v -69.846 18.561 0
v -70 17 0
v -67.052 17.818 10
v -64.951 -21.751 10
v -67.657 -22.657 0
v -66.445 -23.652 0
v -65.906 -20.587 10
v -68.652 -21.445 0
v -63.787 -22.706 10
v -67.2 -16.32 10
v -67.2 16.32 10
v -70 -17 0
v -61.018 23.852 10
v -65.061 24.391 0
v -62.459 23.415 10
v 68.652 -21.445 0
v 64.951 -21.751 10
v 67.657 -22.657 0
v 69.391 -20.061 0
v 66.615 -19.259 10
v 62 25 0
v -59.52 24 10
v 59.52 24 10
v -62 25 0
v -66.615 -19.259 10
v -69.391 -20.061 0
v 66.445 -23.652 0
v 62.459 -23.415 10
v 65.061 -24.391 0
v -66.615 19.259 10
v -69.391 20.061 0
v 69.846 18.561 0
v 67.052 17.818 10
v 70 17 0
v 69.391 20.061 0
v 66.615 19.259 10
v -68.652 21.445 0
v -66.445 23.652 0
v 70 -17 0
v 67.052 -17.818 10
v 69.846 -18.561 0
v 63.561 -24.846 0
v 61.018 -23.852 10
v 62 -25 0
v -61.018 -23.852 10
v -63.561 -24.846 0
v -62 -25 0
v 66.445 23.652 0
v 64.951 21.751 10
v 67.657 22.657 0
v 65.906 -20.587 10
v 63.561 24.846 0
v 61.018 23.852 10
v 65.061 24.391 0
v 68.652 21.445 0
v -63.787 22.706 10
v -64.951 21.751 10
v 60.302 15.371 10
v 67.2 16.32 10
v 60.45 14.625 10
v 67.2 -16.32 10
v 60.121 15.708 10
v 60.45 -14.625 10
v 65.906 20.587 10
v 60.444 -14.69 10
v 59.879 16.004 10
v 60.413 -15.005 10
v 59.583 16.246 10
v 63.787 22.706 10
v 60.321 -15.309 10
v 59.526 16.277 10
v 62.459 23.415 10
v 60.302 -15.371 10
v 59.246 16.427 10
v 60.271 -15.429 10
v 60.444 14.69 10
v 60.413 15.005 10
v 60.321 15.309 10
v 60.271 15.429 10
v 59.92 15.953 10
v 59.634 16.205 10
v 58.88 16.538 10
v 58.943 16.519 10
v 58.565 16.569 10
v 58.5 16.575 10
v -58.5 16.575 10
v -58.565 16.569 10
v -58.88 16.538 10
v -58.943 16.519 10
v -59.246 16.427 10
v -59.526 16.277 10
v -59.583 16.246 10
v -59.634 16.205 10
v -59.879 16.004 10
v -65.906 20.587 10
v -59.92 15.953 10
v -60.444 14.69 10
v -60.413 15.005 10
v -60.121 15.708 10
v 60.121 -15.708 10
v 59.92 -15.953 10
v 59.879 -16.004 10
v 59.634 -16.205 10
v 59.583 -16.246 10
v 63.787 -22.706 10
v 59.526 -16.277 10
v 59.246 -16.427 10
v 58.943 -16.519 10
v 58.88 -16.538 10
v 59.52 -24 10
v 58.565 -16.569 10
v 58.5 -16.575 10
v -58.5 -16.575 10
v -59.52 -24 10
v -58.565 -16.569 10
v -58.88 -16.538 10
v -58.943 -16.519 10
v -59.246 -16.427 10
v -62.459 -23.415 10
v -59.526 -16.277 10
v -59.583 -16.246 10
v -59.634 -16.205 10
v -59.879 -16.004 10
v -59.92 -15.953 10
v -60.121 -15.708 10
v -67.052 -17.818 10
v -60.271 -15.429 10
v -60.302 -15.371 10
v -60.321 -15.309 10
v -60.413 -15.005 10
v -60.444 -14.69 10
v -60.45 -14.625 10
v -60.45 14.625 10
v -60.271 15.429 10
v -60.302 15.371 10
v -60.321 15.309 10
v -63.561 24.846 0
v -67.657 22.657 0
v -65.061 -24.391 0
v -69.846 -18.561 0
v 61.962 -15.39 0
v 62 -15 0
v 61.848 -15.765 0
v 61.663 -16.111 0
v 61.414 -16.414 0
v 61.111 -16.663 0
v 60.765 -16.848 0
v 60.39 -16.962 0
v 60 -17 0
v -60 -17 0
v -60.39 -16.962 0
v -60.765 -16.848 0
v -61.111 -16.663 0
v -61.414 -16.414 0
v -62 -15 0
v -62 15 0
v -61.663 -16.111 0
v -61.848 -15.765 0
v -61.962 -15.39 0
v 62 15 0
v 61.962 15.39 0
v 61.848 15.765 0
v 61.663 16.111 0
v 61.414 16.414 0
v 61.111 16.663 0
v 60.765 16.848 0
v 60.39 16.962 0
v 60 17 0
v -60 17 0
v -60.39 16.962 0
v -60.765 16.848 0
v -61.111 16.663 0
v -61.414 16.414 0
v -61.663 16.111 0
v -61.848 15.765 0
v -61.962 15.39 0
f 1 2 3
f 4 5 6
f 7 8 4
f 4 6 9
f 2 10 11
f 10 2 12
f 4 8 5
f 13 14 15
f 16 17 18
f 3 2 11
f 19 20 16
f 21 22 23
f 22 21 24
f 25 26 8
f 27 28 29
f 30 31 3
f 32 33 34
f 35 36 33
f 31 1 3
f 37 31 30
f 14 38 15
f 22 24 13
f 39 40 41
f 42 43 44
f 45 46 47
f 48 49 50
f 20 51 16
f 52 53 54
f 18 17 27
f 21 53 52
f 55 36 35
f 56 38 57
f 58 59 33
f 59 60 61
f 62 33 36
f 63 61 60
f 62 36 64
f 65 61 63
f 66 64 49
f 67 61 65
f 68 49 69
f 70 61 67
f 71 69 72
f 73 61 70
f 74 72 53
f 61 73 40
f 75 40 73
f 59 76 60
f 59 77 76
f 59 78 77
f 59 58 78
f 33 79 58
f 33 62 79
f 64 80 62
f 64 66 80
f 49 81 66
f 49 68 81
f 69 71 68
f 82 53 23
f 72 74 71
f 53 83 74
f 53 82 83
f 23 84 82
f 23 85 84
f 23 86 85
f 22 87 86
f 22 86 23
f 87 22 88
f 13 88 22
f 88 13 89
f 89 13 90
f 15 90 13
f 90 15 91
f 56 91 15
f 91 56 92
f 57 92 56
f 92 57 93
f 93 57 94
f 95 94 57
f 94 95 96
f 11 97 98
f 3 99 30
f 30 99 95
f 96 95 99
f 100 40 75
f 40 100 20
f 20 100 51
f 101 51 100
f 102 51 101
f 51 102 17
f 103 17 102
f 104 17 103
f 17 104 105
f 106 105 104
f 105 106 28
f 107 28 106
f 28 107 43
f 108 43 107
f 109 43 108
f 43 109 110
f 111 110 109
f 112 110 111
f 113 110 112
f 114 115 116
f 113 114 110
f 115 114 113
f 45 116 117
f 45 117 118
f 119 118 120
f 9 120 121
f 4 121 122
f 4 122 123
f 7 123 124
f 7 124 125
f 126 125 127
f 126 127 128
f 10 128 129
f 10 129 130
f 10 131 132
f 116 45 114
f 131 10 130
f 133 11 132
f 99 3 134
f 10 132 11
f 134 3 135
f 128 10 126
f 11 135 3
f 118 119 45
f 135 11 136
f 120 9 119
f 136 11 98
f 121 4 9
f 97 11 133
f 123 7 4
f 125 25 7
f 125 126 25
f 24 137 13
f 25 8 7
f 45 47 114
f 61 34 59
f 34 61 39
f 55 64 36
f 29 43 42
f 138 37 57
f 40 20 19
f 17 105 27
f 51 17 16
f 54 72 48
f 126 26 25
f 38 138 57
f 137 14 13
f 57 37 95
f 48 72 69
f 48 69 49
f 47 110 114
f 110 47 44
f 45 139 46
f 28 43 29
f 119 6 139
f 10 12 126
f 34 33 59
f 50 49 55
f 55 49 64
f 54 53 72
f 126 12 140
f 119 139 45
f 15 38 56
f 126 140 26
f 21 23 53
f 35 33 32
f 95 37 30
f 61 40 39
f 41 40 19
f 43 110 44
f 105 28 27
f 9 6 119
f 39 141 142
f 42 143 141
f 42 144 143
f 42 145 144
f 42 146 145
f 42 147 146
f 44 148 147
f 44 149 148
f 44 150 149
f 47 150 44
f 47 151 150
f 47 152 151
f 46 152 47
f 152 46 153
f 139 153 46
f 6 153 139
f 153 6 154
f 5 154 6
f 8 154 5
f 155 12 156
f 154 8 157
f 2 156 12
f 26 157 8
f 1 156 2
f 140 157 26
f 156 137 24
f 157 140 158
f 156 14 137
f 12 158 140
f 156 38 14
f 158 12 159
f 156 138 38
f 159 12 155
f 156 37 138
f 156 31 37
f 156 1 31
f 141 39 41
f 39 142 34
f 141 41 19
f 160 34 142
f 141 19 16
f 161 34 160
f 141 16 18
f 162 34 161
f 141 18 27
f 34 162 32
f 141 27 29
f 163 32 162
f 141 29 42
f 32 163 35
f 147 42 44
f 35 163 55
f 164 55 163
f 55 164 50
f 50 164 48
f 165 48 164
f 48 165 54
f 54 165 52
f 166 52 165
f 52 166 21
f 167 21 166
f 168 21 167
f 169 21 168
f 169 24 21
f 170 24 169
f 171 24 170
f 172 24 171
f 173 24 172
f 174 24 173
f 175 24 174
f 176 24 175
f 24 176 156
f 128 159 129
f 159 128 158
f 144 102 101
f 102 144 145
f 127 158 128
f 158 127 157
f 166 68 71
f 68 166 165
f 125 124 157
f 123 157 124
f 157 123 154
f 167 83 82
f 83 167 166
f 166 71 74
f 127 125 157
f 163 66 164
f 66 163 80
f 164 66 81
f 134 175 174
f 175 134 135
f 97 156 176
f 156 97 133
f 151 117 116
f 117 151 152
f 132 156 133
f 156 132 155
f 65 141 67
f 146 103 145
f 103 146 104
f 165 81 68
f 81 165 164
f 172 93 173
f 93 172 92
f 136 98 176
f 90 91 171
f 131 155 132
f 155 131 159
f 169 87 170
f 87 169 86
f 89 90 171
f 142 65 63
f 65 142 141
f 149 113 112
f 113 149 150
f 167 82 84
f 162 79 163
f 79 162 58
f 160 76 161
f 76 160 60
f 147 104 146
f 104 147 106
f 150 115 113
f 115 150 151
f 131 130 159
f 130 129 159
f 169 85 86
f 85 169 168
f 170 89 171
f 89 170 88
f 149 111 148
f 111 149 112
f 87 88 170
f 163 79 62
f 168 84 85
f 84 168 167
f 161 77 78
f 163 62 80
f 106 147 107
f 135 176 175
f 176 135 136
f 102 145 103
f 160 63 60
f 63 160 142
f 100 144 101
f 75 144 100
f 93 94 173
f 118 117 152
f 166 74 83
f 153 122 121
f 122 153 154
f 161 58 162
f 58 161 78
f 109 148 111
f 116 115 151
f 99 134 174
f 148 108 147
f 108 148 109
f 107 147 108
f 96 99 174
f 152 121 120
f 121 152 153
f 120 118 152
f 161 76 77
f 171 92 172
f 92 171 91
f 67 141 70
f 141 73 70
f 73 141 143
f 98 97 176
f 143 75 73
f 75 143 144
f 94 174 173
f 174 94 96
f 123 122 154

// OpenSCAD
$fn = 32;

// ----------------------------------------------------------------------
// Display bezel: 140 x 50 mm frame, opening 124x34 mm
// ----------------------------------------------------------------------

// --- parameters (mm) ---
length = 140;             // frame outside length, X
width = 50;               // frame outside width, Y
frame_w = 8;              // frame width
thickness = 10;           // frame thickness
corner_r = 8;             // outside corner radius
chamfer = 0.96;           // outer wall taper
funnel = 0.97;            // inner opening taper
opening_l = 124;          // opening length
opening_w = 34;           // opening width
inner_r = 2;              // opening corner radius

/* rounded-rectangle outlines, generated with loops */
module rounded_ring(l_nom, w_nom, r) {
  hull() {
    for (sx = [-1, 1]) for (sy = [-1, 1])
      translate([sx * (l_nom / 2 - r), sy * (w_nom / 2 - r)]) circle(r = r);
  }
}

difference() {
  /* frame body, drafted so the outer edge is a variable-depth chamfer */
  linear_extrude(height = thickness, scale = chamfer)
    rounded_ring(length, width, corner_r);
  /* viewing opening, drafted the other way for a funnel edge */
  linear_extrude(height = thickness + 2, scale = funnel)
    translate([0, 0, -1]) rounded_ring(opening_l, opening_w, inner_r);
}
